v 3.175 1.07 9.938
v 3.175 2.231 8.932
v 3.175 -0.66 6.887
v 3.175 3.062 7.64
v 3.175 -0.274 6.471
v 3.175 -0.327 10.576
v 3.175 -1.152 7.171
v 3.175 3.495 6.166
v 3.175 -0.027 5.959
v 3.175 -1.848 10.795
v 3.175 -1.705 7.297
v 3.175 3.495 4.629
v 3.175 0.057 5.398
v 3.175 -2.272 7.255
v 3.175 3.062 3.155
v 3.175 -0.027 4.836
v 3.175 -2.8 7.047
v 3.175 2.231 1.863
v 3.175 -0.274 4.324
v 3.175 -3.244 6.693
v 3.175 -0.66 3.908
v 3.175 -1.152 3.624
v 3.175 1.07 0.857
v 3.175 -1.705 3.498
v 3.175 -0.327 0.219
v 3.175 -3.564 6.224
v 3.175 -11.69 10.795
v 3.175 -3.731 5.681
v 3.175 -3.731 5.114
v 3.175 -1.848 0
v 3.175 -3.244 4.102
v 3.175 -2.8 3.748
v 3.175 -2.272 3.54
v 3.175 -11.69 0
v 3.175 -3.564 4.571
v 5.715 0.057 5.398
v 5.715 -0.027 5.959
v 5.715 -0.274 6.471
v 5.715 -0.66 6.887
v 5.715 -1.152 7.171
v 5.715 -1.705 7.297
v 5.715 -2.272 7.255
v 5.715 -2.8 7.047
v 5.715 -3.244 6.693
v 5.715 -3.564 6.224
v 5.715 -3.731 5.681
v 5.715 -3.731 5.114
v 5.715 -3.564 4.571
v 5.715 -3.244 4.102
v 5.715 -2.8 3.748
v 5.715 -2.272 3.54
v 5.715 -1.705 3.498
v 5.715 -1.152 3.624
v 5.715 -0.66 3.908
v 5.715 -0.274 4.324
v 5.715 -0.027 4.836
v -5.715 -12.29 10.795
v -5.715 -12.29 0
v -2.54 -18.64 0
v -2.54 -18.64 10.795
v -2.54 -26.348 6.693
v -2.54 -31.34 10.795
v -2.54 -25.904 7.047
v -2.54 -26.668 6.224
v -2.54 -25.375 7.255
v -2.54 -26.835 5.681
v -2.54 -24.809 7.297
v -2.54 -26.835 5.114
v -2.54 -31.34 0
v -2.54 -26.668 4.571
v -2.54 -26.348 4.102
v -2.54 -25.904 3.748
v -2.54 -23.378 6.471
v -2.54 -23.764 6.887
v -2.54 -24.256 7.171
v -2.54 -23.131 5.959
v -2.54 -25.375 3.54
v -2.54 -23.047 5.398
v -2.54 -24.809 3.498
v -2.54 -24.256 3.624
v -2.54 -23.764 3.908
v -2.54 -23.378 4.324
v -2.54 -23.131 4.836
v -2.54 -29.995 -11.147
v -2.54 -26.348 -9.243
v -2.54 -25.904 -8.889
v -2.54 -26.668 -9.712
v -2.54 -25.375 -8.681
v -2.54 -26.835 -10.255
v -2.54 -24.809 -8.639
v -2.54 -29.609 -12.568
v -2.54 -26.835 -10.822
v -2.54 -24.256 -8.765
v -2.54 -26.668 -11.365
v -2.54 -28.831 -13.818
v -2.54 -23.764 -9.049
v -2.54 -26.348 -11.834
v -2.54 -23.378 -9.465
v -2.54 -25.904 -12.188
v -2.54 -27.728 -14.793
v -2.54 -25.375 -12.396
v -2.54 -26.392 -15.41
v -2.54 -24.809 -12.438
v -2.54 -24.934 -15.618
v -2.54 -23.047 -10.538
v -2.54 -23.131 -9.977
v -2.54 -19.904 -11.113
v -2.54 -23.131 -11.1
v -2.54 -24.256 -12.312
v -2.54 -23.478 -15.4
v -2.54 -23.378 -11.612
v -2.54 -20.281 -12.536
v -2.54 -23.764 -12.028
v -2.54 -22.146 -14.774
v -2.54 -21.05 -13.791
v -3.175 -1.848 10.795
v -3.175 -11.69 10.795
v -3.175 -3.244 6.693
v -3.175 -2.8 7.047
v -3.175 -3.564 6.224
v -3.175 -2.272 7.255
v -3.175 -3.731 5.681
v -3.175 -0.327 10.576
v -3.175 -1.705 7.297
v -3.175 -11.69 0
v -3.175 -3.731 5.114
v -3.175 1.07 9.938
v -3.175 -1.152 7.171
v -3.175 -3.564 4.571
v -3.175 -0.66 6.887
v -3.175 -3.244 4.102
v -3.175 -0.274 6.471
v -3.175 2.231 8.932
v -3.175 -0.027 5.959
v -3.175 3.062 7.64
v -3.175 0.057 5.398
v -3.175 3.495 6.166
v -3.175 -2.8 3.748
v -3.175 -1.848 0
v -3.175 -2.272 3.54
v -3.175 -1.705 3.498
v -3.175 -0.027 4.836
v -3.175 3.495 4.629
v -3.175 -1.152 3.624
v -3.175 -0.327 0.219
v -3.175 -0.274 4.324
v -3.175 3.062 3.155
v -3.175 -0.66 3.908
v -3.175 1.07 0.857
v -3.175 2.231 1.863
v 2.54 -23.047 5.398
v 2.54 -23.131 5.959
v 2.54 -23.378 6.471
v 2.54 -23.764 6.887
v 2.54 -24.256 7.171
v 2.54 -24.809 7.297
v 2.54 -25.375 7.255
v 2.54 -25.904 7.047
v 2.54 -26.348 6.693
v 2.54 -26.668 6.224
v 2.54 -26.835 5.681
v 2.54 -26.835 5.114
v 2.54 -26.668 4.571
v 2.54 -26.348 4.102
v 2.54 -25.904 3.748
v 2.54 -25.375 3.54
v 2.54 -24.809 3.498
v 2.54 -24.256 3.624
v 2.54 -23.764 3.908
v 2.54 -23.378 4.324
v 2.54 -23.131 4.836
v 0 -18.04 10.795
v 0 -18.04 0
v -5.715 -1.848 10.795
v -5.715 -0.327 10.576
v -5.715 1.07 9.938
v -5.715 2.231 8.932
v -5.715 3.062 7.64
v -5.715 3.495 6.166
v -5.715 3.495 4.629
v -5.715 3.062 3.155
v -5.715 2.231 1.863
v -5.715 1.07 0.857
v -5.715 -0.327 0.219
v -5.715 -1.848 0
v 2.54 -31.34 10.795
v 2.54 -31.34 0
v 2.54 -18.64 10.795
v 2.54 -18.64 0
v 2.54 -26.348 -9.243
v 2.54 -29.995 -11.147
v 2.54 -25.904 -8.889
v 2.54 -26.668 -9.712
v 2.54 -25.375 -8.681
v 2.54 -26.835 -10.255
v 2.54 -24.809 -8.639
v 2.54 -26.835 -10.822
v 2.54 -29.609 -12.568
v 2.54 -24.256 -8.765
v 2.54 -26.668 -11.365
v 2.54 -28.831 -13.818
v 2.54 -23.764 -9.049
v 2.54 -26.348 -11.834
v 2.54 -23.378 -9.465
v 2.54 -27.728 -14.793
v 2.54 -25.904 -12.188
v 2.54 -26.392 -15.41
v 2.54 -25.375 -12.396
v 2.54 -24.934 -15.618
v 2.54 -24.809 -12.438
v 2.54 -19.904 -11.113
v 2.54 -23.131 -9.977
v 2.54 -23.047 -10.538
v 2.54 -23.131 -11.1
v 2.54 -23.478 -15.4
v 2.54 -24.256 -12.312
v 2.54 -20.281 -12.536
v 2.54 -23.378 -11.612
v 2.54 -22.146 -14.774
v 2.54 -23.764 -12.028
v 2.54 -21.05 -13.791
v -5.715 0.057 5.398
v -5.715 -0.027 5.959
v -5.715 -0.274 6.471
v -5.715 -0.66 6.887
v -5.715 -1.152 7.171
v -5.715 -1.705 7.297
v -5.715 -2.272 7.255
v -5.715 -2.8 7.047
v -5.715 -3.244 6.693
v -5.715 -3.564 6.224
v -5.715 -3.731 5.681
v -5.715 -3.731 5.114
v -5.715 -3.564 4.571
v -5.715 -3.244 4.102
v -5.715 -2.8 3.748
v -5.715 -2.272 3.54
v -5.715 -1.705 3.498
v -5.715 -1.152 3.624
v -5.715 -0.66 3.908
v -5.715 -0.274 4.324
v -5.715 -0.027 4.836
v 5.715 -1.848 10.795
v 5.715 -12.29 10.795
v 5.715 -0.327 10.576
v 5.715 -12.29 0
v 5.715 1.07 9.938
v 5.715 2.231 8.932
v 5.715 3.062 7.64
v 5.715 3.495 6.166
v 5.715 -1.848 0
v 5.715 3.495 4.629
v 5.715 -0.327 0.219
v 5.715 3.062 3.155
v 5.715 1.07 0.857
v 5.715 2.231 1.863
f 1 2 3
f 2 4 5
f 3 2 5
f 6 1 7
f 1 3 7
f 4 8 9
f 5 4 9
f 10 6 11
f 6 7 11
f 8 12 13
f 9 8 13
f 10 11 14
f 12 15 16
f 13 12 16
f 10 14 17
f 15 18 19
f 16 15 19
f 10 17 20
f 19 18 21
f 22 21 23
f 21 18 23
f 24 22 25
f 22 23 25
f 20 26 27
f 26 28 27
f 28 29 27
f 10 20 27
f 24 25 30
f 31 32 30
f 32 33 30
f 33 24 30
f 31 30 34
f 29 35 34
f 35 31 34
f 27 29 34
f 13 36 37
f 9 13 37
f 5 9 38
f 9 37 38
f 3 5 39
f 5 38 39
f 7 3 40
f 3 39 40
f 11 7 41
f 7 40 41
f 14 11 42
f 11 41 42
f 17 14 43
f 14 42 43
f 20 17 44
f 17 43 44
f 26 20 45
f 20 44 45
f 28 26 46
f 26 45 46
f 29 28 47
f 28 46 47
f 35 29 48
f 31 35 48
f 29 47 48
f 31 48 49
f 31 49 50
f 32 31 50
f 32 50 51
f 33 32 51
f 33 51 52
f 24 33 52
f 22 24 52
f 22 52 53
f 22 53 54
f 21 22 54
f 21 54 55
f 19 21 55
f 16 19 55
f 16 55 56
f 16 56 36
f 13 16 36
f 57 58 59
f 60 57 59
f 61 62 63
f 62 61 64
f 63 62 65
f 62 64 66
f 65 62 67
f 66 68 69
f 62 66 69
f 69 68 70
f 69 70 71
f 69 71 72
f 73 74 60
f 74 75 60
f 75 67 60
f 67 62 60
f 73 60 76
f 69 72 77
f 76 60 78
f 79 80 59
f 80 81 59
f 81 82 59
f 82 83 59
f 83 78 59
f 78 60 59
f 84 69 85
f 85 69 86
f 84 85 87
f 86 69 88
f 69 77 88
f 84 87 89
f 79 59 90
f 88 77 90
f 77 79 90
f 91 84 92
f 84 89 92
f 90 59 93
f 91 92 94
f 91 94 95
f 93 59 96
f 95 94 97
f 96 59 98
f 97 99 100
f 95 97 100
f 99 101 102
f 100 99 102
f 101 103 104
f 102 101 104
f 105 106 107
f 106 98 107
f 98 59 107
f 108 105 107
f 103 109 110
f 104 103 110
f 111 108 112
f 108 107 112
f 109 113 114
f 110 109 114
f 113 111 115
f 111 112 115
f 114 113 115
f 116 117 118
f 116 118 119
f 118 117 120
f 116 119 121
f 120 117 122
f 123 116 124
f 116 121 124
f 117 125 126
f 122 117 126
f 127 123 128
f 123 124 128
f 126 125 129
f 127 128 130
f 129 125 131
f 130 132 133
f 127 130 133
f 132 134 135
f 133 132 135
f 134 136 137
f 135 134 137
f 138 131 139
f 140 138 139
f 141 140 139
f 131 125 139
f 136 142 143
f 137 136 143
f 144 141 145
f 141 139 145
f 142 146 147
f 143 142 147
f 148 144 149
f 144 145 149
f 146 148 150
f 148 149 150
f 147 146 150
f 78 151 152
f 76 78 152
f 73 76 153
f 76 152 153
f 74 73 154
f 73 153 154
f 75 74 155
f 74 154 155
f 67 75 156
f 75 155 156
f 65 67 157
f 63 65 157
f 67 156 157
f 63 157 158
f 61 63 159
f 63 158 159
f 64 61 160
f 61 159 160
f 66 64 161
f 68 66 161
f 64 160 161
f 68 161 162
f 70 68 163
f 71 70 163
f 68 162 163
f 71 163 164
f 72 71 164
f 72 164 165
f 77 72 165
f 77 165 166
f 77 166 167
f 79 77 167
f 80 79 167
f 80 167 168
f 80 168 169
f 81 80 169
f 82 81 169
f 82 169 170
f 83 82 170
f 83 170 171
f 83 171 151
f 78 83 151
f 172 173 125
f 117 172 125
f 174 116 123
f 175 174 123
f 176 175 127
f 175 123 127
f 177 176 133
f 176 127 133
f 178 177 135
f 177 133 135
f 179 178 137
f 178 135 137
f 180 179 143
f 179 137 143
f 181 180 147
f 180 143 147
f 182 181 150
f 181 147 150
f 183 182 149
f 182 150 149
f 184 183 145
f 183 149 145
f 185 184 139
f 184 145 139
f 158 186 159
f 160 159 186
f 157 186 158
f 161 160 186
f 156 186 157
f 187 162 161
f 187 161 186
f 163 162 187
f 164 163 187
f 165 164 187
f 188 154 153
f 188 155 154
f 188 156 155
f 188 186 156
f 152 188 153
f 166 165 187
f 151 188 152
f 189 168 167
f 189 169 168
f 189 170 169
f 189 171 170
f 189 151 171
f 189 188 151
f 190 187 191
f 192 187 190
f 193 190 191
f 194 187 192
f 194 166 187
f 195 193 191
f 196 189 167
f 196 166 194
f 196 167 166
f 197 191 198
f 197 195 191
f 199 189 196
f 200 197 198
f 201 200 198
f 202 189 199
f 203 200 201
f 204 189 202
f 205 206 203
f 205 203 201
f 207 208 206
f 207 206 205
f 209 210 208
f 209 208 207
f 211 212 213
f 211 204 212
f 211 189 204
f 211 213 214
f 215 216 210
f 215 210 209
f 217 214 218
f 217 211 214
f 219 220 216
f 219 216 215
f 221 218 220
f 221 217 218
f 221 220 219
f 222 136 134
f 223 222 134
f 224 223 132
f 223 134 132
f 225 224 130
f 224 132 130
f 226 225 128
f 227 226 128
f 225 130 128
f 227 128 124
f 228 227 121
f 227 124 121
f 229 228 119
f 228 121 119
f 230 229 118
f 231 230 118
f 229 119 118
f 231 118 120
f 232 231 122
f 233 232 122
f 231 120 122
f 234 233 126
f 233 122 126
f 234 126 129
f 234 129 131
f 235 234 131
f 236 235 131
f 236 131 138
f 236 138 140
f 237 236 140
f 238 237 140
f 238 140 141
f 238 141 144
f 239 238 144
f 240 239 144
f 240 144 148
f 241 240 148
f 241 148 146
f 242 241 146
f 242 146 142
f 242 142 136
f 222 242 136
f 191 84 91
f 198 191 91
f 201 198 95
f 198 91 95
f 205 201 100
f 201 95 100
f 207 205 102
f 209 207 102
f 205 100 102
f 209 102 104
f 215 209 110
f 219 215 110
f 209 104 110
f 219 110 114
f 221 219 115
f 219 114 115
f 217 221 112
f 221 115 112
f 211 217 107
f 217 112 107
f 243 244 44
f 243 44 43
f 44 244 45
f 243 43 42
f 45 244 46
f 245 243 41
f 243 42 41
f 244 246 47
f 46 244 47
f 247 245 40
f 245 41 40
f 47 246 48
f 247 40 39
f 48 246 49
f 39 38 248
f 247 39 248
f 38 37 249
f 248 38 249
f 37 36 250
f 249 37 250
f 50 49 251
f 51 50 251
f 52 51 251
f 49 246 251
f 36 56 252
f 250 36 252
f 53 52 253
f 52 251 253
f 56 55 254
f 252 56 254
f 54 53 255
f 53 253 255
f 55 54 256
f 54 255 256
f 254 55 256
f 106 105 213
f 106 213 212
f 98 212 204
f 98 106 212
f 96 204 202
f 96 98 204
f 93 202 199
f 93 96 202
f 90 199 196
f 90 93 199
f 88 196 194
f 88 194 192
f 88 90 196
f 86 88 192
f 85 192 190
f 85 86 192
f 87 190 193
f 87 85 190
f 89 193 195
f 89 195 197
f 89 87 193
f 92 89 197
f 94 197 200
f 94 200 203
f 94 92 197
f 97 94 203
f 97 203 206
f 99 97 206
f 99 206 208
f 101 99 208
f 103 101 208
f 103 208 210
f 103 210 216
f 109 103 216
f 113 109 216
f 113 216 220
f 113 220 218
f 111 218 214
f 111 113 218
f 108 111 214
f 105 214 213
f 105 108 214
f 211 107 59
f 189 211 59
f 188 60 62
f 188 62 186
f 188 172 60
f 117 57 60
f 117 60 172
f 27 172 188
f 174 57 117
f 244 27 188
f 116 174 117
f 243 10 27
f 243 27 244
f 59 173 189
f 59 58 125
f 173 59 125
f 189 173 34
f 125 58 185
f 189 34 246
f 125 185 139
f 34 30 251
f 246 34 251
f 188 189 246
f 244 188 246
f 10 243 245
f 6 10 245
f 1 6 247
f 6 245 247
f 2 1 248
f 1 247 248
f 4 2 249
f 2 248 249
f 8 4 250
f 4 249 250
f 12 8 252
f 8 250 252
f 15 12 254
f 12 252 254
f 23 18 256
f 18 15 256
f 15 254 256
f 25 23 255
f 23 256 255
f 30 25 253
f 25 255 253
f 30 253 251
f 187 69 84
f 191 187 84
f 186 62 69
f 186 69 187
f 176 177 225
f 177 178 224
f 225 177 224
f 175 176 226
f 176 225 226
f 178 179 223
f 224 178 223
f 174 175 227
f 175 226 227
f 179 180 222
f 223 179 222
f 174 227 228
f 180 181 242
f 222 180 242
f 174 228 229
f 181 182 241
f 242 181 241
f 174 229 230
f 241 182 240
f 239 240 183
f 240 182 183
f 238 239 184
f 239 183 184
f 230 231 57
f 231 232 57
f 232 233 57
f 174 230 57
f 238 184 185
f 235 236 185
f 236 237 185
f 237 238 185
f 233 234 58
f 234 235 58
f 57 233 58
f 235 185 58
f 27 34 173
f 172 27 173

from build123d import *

# Parameters (mm, degrees)
BASE_EXTRUDE_DEPTH  = 10.795
SKETCH2_R           = 1.905
CUT_EXTRUDE1_DEPTH  = 36.062279171
FILLET1_R           = 5.3975
SKETCH3_R           = 1.905
CUT_EXTRUDE2_DEPTH  = 35.159384445
BOSS_EXTRUDE1_START = -5.08
SKETCH4_R           = 1.905
BOSS_EXTRUDE1_DEPTH = 5.08


with BuildPart() as part:
    # Sketch1 → Base-Extrude (new body)
    with BuildSketch(Plane.XY):
        Polygon((-3.175, 3.549757914), (-5.715, 3.549757914), (-5.715, -12.289854749), (-2.54, -18.639854749), (-2.54, -31.339854749), (2.54, -31.339854749), (2.54, -18.639854749), (5.715, -12.289854749), (5.715, 3.549757914), (3.175, 3.549757914), (3.175, -11.690242086), (0, -18.040242086), (-3.175, -11.690242086), align=None)
    extrude(amount=BASE_EXTRUDE_DEPTH)

    # Sketch2 → Cut-Extrude1 (cut, through all)
    with BuildSketch(Plane(origin=(5.715, 0, 0), x_dir=(0, 0, -1), z_dir=(1, 0, 0))):
        with Locations(Location((-5.3975, -1.847742086, 0), (0, 0, 90))):
            Circle(SKETCH2_R)
    extrude(amount=-CUT_EXTRUDE1_DEPTH, mode=Mode.SUBTRACT)

    # Fillet1
    # the kernel refuses this fillet: 5.3975 mm, written as the material it takes off along each edge
    with BuildSketch(Plane(origin=(19.20875, 3.549757914, 0), x_dir=(0, -1, 0), z_dir=(-1, 0, 0)), Plane(origin=(10.31875, 3.549757914, 10.795), x_dir=(0, 0, -1), z_dir=(-1, 0, 0))) as fillet1_piece_1:
        with BuildLine():
            CenterArc((FILLET1_R, FILLET1_R), FILLET1_R, 180, 90)
            Line((0, FILLET1_R), (0, 0))
            Line((0, 0), (FILLET1_R, 0))
        make_face()
    extrude(amount=29.5275, mode=Mode.SUBTRACT)
    with BuildSketch(Plane(origin=(10.31875, 3.549757914, 0), x_dir=(0, 0, 1), z_dir=(-1, 0, 0)), Plane(origin=(19.20875, 3.549757914, 10.795), x_dir=(0, -1, 0), z_dir=(-1, 0, 0))) as fillet1_piece_2:
        with BuildLine():
            CenterArc((FILLET1_R, -FILLET1_R), FILLET1_R, 90, 90)
            Line((0, -FILLET1_R), (0, 0))
            Line((0, 0), (FILLET1_R, 0))
        make_face()
    extrude(amount=29.5275, mode=Mode.SUBTRACT)

    # Sketch3 → Cut-Extrude2 (cut, through all)
    with BuildSketch(Plane(origin=(2.54, 0, 0), x_dir=(0, 0, -1), z_dir=(1, 0, 0))):
        with Locations(Location((-5.3975, -24.951582086, 0), (0, 0, 90))):
            Circle(SKETCH3_R)
    extrude(amount=-CUT_EXTRUDE2_DEPTH, mode=Mode.SUBTRACT)

    # Sketch4 → Boss-Extrude1 (add)
    with BuildSketch(Plane(origin=(2.54, 0, 0), x_dir=(0, 0, -1), z_dir=(1, 0, 0)).offset(BOSS_EXTRUDE1_START)):
        with BuildLine():
            Line((0, -31.339854749), (11.146934896, -29.995009323))
            ThreePointArc((11.146934896, -29.995009323), (15.618430773, -24.934350077), (11.112705191, -19.904142887))
            Line((11.112705191, -19.904142887), (0, -18.639854749))
            Line((0, -18.639854749), (0, -31.339854749))
        make_face()
        with Locations(Location((10.53846, -24.951582086, 0), (0, 0, 90))):
            Circle(SKETCH4_R, mode=Mode.SUBTRACT)
    extrude(amount=BOSS_EXTRUDE1_DEPTH)


solid = part.part
